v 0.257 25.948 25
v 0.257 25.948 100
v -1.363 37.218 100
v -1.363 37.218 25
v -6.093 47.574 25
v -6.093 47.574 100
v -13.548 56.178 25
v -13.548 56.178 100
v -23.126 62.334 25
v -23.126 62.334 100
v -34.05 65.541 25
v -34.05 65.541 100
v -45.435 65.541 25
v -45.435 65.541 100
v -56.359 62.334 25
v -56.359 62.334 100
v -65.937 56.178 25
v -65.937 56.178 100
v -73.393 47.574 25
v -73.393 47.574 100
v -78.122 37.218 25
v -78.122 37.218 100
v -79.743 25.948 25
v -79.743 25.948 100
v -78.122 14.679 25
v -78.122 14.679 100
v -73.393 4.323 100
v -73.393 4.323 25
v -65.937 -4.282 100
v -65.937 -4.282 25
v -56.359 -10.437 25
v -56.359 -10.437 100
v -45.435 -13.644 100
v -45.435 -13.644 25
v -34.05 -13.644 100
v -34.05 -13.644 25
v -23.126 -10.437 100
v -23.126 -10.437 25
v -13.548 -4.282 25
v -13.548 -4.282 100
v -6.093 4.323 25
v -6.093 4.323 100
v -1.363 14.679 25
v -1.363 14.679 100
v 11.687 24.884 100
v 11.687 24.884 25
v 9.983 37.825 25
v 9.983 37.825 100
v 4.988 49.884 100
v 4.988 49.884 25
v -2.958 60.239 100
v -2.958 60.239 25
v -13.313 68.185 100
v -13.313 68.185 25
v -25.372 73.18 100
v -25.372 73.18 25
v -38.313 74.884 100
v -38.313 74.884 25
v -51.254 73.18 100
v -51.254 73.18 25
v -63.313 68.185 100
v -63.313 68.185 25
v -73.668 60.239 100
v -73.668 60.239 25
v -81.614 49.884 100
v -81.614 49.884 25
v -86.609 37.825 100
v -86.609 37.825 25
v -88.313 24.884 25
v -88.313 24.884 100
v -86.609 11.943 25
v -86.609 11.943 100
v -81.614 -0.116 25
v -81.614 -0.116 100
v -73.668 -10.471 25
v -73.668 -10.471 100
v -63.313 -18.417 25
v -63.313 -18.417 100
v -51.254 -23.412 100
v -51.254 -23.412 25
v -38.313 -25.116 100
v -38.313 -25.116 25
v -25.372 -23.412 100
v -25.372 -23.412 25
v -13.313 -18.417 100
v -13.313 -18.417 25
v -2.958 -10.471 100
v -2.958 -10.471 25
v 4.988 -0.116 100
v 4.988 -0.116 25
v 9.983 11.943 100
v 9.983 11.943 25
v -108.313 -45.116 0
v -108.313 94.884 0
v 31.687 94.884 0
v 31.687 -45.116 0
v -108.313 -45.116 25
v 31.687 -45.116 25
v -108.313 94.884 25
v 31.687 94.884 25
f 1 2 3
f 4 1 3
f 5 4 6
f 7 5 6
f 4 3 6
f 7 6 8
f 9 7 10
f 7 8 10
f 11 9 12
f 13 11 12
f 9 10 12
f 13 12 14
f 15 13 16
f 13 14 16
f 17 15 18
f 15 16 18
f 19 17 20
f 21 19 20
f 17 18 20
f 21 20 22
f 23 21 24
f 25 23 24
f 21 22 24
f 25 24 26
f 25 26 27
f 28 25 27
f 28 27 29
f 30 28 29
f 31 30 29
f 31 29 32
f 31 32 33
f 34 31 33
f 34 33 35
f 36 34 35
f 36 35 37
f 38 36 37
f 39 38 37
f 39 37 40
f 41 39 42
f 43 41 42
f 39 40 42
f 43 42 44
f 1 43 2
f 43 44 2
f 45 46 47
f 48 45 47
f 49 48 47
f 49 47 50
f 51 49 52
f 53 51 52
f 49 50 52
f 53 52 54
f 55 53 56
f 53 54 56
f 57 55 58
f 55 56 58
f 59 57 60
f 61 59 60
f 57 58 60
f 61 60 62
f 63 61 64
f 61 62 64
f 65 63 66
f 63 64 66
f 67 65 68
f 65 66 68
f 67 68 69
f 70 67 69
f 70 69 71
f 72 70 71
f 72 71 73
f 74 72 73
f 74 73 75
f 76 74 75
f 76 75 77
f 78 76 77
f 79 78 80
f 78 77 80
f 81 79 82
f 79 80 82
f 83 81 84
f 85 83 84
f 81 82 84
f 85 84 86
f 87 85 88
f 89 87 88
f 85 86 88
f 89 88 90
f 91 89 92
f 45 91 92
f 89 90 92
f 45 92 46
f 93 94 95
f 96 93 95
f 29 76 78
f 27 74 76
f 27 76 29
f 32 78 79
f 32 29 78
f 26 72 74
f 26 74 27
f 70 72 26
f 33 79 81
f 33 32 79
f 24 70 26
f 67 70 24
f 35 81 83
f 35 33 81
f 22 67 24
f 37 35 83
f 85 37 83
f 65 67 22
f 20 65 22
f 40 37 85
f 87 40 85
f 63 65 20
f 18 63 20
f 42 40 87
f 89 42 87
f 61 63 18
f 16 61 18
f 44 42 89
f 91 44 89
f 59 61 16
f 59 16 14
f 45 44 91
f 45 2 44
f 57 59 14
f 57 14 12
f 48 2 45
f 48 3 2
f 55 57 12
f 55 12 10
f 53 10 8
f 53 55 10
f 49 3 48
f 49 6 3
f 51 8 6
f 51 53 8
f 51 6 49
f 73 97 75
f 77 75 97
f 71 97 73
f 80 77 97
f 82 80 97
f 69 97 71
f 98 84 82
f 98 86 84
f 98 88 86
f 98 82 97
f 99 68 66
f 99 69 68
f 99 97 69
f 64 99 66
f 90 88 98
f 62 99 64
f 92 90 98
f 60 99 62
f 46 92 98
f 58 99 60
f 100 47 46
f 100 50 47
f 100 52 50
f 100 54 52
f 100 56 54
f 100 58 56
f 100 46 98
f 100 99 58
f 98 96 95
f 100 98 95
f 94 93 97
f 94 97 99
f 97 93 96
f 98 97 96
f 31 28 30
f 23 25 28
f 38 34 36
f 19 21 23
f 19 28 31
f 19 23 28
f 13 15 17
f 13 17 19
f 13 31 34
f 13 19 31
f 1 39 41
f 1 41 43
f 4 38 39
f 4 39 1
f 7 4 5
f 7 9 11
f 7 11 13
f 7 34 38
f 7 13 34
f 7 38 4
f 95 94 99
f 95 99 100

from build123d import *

# Parameters (mm, degrees)
F0_W     = 140
F0_H     = 140
F1_DEPTH = 25
F2_R     = 50
F3_DEPTH = 75
F4_R     = 40
F5_DEPTH = 75


with BuildPart() as f1:
    # F0 (on Top) → F1 (new body)
    with BuildSketch(Plane.XY):
        with Locations((-38.313064, 24.884112)):
            Rectangle(F0_W, F0_H)
    extrude(amount=F1_DEPTH)

    # F2 (on face) → F3 (join)
    with BuildSketch(Plane.XY.offset(25)):
        with Locations((-38.313064, 24.884112)):
            Circle(F2_R)
    extrude(amount=F3_DEPTH)

    # F4 (on face) → F5 (cut)
    with BuildSketch(Plane.XY.offset(100)):
        with Locations((-39.742772, 25.948399)):
            Circle(F4_R)
    extrude(amount=-F5_DEPTH, mode=Mode.SUBTRACT)


solid = f1.part
